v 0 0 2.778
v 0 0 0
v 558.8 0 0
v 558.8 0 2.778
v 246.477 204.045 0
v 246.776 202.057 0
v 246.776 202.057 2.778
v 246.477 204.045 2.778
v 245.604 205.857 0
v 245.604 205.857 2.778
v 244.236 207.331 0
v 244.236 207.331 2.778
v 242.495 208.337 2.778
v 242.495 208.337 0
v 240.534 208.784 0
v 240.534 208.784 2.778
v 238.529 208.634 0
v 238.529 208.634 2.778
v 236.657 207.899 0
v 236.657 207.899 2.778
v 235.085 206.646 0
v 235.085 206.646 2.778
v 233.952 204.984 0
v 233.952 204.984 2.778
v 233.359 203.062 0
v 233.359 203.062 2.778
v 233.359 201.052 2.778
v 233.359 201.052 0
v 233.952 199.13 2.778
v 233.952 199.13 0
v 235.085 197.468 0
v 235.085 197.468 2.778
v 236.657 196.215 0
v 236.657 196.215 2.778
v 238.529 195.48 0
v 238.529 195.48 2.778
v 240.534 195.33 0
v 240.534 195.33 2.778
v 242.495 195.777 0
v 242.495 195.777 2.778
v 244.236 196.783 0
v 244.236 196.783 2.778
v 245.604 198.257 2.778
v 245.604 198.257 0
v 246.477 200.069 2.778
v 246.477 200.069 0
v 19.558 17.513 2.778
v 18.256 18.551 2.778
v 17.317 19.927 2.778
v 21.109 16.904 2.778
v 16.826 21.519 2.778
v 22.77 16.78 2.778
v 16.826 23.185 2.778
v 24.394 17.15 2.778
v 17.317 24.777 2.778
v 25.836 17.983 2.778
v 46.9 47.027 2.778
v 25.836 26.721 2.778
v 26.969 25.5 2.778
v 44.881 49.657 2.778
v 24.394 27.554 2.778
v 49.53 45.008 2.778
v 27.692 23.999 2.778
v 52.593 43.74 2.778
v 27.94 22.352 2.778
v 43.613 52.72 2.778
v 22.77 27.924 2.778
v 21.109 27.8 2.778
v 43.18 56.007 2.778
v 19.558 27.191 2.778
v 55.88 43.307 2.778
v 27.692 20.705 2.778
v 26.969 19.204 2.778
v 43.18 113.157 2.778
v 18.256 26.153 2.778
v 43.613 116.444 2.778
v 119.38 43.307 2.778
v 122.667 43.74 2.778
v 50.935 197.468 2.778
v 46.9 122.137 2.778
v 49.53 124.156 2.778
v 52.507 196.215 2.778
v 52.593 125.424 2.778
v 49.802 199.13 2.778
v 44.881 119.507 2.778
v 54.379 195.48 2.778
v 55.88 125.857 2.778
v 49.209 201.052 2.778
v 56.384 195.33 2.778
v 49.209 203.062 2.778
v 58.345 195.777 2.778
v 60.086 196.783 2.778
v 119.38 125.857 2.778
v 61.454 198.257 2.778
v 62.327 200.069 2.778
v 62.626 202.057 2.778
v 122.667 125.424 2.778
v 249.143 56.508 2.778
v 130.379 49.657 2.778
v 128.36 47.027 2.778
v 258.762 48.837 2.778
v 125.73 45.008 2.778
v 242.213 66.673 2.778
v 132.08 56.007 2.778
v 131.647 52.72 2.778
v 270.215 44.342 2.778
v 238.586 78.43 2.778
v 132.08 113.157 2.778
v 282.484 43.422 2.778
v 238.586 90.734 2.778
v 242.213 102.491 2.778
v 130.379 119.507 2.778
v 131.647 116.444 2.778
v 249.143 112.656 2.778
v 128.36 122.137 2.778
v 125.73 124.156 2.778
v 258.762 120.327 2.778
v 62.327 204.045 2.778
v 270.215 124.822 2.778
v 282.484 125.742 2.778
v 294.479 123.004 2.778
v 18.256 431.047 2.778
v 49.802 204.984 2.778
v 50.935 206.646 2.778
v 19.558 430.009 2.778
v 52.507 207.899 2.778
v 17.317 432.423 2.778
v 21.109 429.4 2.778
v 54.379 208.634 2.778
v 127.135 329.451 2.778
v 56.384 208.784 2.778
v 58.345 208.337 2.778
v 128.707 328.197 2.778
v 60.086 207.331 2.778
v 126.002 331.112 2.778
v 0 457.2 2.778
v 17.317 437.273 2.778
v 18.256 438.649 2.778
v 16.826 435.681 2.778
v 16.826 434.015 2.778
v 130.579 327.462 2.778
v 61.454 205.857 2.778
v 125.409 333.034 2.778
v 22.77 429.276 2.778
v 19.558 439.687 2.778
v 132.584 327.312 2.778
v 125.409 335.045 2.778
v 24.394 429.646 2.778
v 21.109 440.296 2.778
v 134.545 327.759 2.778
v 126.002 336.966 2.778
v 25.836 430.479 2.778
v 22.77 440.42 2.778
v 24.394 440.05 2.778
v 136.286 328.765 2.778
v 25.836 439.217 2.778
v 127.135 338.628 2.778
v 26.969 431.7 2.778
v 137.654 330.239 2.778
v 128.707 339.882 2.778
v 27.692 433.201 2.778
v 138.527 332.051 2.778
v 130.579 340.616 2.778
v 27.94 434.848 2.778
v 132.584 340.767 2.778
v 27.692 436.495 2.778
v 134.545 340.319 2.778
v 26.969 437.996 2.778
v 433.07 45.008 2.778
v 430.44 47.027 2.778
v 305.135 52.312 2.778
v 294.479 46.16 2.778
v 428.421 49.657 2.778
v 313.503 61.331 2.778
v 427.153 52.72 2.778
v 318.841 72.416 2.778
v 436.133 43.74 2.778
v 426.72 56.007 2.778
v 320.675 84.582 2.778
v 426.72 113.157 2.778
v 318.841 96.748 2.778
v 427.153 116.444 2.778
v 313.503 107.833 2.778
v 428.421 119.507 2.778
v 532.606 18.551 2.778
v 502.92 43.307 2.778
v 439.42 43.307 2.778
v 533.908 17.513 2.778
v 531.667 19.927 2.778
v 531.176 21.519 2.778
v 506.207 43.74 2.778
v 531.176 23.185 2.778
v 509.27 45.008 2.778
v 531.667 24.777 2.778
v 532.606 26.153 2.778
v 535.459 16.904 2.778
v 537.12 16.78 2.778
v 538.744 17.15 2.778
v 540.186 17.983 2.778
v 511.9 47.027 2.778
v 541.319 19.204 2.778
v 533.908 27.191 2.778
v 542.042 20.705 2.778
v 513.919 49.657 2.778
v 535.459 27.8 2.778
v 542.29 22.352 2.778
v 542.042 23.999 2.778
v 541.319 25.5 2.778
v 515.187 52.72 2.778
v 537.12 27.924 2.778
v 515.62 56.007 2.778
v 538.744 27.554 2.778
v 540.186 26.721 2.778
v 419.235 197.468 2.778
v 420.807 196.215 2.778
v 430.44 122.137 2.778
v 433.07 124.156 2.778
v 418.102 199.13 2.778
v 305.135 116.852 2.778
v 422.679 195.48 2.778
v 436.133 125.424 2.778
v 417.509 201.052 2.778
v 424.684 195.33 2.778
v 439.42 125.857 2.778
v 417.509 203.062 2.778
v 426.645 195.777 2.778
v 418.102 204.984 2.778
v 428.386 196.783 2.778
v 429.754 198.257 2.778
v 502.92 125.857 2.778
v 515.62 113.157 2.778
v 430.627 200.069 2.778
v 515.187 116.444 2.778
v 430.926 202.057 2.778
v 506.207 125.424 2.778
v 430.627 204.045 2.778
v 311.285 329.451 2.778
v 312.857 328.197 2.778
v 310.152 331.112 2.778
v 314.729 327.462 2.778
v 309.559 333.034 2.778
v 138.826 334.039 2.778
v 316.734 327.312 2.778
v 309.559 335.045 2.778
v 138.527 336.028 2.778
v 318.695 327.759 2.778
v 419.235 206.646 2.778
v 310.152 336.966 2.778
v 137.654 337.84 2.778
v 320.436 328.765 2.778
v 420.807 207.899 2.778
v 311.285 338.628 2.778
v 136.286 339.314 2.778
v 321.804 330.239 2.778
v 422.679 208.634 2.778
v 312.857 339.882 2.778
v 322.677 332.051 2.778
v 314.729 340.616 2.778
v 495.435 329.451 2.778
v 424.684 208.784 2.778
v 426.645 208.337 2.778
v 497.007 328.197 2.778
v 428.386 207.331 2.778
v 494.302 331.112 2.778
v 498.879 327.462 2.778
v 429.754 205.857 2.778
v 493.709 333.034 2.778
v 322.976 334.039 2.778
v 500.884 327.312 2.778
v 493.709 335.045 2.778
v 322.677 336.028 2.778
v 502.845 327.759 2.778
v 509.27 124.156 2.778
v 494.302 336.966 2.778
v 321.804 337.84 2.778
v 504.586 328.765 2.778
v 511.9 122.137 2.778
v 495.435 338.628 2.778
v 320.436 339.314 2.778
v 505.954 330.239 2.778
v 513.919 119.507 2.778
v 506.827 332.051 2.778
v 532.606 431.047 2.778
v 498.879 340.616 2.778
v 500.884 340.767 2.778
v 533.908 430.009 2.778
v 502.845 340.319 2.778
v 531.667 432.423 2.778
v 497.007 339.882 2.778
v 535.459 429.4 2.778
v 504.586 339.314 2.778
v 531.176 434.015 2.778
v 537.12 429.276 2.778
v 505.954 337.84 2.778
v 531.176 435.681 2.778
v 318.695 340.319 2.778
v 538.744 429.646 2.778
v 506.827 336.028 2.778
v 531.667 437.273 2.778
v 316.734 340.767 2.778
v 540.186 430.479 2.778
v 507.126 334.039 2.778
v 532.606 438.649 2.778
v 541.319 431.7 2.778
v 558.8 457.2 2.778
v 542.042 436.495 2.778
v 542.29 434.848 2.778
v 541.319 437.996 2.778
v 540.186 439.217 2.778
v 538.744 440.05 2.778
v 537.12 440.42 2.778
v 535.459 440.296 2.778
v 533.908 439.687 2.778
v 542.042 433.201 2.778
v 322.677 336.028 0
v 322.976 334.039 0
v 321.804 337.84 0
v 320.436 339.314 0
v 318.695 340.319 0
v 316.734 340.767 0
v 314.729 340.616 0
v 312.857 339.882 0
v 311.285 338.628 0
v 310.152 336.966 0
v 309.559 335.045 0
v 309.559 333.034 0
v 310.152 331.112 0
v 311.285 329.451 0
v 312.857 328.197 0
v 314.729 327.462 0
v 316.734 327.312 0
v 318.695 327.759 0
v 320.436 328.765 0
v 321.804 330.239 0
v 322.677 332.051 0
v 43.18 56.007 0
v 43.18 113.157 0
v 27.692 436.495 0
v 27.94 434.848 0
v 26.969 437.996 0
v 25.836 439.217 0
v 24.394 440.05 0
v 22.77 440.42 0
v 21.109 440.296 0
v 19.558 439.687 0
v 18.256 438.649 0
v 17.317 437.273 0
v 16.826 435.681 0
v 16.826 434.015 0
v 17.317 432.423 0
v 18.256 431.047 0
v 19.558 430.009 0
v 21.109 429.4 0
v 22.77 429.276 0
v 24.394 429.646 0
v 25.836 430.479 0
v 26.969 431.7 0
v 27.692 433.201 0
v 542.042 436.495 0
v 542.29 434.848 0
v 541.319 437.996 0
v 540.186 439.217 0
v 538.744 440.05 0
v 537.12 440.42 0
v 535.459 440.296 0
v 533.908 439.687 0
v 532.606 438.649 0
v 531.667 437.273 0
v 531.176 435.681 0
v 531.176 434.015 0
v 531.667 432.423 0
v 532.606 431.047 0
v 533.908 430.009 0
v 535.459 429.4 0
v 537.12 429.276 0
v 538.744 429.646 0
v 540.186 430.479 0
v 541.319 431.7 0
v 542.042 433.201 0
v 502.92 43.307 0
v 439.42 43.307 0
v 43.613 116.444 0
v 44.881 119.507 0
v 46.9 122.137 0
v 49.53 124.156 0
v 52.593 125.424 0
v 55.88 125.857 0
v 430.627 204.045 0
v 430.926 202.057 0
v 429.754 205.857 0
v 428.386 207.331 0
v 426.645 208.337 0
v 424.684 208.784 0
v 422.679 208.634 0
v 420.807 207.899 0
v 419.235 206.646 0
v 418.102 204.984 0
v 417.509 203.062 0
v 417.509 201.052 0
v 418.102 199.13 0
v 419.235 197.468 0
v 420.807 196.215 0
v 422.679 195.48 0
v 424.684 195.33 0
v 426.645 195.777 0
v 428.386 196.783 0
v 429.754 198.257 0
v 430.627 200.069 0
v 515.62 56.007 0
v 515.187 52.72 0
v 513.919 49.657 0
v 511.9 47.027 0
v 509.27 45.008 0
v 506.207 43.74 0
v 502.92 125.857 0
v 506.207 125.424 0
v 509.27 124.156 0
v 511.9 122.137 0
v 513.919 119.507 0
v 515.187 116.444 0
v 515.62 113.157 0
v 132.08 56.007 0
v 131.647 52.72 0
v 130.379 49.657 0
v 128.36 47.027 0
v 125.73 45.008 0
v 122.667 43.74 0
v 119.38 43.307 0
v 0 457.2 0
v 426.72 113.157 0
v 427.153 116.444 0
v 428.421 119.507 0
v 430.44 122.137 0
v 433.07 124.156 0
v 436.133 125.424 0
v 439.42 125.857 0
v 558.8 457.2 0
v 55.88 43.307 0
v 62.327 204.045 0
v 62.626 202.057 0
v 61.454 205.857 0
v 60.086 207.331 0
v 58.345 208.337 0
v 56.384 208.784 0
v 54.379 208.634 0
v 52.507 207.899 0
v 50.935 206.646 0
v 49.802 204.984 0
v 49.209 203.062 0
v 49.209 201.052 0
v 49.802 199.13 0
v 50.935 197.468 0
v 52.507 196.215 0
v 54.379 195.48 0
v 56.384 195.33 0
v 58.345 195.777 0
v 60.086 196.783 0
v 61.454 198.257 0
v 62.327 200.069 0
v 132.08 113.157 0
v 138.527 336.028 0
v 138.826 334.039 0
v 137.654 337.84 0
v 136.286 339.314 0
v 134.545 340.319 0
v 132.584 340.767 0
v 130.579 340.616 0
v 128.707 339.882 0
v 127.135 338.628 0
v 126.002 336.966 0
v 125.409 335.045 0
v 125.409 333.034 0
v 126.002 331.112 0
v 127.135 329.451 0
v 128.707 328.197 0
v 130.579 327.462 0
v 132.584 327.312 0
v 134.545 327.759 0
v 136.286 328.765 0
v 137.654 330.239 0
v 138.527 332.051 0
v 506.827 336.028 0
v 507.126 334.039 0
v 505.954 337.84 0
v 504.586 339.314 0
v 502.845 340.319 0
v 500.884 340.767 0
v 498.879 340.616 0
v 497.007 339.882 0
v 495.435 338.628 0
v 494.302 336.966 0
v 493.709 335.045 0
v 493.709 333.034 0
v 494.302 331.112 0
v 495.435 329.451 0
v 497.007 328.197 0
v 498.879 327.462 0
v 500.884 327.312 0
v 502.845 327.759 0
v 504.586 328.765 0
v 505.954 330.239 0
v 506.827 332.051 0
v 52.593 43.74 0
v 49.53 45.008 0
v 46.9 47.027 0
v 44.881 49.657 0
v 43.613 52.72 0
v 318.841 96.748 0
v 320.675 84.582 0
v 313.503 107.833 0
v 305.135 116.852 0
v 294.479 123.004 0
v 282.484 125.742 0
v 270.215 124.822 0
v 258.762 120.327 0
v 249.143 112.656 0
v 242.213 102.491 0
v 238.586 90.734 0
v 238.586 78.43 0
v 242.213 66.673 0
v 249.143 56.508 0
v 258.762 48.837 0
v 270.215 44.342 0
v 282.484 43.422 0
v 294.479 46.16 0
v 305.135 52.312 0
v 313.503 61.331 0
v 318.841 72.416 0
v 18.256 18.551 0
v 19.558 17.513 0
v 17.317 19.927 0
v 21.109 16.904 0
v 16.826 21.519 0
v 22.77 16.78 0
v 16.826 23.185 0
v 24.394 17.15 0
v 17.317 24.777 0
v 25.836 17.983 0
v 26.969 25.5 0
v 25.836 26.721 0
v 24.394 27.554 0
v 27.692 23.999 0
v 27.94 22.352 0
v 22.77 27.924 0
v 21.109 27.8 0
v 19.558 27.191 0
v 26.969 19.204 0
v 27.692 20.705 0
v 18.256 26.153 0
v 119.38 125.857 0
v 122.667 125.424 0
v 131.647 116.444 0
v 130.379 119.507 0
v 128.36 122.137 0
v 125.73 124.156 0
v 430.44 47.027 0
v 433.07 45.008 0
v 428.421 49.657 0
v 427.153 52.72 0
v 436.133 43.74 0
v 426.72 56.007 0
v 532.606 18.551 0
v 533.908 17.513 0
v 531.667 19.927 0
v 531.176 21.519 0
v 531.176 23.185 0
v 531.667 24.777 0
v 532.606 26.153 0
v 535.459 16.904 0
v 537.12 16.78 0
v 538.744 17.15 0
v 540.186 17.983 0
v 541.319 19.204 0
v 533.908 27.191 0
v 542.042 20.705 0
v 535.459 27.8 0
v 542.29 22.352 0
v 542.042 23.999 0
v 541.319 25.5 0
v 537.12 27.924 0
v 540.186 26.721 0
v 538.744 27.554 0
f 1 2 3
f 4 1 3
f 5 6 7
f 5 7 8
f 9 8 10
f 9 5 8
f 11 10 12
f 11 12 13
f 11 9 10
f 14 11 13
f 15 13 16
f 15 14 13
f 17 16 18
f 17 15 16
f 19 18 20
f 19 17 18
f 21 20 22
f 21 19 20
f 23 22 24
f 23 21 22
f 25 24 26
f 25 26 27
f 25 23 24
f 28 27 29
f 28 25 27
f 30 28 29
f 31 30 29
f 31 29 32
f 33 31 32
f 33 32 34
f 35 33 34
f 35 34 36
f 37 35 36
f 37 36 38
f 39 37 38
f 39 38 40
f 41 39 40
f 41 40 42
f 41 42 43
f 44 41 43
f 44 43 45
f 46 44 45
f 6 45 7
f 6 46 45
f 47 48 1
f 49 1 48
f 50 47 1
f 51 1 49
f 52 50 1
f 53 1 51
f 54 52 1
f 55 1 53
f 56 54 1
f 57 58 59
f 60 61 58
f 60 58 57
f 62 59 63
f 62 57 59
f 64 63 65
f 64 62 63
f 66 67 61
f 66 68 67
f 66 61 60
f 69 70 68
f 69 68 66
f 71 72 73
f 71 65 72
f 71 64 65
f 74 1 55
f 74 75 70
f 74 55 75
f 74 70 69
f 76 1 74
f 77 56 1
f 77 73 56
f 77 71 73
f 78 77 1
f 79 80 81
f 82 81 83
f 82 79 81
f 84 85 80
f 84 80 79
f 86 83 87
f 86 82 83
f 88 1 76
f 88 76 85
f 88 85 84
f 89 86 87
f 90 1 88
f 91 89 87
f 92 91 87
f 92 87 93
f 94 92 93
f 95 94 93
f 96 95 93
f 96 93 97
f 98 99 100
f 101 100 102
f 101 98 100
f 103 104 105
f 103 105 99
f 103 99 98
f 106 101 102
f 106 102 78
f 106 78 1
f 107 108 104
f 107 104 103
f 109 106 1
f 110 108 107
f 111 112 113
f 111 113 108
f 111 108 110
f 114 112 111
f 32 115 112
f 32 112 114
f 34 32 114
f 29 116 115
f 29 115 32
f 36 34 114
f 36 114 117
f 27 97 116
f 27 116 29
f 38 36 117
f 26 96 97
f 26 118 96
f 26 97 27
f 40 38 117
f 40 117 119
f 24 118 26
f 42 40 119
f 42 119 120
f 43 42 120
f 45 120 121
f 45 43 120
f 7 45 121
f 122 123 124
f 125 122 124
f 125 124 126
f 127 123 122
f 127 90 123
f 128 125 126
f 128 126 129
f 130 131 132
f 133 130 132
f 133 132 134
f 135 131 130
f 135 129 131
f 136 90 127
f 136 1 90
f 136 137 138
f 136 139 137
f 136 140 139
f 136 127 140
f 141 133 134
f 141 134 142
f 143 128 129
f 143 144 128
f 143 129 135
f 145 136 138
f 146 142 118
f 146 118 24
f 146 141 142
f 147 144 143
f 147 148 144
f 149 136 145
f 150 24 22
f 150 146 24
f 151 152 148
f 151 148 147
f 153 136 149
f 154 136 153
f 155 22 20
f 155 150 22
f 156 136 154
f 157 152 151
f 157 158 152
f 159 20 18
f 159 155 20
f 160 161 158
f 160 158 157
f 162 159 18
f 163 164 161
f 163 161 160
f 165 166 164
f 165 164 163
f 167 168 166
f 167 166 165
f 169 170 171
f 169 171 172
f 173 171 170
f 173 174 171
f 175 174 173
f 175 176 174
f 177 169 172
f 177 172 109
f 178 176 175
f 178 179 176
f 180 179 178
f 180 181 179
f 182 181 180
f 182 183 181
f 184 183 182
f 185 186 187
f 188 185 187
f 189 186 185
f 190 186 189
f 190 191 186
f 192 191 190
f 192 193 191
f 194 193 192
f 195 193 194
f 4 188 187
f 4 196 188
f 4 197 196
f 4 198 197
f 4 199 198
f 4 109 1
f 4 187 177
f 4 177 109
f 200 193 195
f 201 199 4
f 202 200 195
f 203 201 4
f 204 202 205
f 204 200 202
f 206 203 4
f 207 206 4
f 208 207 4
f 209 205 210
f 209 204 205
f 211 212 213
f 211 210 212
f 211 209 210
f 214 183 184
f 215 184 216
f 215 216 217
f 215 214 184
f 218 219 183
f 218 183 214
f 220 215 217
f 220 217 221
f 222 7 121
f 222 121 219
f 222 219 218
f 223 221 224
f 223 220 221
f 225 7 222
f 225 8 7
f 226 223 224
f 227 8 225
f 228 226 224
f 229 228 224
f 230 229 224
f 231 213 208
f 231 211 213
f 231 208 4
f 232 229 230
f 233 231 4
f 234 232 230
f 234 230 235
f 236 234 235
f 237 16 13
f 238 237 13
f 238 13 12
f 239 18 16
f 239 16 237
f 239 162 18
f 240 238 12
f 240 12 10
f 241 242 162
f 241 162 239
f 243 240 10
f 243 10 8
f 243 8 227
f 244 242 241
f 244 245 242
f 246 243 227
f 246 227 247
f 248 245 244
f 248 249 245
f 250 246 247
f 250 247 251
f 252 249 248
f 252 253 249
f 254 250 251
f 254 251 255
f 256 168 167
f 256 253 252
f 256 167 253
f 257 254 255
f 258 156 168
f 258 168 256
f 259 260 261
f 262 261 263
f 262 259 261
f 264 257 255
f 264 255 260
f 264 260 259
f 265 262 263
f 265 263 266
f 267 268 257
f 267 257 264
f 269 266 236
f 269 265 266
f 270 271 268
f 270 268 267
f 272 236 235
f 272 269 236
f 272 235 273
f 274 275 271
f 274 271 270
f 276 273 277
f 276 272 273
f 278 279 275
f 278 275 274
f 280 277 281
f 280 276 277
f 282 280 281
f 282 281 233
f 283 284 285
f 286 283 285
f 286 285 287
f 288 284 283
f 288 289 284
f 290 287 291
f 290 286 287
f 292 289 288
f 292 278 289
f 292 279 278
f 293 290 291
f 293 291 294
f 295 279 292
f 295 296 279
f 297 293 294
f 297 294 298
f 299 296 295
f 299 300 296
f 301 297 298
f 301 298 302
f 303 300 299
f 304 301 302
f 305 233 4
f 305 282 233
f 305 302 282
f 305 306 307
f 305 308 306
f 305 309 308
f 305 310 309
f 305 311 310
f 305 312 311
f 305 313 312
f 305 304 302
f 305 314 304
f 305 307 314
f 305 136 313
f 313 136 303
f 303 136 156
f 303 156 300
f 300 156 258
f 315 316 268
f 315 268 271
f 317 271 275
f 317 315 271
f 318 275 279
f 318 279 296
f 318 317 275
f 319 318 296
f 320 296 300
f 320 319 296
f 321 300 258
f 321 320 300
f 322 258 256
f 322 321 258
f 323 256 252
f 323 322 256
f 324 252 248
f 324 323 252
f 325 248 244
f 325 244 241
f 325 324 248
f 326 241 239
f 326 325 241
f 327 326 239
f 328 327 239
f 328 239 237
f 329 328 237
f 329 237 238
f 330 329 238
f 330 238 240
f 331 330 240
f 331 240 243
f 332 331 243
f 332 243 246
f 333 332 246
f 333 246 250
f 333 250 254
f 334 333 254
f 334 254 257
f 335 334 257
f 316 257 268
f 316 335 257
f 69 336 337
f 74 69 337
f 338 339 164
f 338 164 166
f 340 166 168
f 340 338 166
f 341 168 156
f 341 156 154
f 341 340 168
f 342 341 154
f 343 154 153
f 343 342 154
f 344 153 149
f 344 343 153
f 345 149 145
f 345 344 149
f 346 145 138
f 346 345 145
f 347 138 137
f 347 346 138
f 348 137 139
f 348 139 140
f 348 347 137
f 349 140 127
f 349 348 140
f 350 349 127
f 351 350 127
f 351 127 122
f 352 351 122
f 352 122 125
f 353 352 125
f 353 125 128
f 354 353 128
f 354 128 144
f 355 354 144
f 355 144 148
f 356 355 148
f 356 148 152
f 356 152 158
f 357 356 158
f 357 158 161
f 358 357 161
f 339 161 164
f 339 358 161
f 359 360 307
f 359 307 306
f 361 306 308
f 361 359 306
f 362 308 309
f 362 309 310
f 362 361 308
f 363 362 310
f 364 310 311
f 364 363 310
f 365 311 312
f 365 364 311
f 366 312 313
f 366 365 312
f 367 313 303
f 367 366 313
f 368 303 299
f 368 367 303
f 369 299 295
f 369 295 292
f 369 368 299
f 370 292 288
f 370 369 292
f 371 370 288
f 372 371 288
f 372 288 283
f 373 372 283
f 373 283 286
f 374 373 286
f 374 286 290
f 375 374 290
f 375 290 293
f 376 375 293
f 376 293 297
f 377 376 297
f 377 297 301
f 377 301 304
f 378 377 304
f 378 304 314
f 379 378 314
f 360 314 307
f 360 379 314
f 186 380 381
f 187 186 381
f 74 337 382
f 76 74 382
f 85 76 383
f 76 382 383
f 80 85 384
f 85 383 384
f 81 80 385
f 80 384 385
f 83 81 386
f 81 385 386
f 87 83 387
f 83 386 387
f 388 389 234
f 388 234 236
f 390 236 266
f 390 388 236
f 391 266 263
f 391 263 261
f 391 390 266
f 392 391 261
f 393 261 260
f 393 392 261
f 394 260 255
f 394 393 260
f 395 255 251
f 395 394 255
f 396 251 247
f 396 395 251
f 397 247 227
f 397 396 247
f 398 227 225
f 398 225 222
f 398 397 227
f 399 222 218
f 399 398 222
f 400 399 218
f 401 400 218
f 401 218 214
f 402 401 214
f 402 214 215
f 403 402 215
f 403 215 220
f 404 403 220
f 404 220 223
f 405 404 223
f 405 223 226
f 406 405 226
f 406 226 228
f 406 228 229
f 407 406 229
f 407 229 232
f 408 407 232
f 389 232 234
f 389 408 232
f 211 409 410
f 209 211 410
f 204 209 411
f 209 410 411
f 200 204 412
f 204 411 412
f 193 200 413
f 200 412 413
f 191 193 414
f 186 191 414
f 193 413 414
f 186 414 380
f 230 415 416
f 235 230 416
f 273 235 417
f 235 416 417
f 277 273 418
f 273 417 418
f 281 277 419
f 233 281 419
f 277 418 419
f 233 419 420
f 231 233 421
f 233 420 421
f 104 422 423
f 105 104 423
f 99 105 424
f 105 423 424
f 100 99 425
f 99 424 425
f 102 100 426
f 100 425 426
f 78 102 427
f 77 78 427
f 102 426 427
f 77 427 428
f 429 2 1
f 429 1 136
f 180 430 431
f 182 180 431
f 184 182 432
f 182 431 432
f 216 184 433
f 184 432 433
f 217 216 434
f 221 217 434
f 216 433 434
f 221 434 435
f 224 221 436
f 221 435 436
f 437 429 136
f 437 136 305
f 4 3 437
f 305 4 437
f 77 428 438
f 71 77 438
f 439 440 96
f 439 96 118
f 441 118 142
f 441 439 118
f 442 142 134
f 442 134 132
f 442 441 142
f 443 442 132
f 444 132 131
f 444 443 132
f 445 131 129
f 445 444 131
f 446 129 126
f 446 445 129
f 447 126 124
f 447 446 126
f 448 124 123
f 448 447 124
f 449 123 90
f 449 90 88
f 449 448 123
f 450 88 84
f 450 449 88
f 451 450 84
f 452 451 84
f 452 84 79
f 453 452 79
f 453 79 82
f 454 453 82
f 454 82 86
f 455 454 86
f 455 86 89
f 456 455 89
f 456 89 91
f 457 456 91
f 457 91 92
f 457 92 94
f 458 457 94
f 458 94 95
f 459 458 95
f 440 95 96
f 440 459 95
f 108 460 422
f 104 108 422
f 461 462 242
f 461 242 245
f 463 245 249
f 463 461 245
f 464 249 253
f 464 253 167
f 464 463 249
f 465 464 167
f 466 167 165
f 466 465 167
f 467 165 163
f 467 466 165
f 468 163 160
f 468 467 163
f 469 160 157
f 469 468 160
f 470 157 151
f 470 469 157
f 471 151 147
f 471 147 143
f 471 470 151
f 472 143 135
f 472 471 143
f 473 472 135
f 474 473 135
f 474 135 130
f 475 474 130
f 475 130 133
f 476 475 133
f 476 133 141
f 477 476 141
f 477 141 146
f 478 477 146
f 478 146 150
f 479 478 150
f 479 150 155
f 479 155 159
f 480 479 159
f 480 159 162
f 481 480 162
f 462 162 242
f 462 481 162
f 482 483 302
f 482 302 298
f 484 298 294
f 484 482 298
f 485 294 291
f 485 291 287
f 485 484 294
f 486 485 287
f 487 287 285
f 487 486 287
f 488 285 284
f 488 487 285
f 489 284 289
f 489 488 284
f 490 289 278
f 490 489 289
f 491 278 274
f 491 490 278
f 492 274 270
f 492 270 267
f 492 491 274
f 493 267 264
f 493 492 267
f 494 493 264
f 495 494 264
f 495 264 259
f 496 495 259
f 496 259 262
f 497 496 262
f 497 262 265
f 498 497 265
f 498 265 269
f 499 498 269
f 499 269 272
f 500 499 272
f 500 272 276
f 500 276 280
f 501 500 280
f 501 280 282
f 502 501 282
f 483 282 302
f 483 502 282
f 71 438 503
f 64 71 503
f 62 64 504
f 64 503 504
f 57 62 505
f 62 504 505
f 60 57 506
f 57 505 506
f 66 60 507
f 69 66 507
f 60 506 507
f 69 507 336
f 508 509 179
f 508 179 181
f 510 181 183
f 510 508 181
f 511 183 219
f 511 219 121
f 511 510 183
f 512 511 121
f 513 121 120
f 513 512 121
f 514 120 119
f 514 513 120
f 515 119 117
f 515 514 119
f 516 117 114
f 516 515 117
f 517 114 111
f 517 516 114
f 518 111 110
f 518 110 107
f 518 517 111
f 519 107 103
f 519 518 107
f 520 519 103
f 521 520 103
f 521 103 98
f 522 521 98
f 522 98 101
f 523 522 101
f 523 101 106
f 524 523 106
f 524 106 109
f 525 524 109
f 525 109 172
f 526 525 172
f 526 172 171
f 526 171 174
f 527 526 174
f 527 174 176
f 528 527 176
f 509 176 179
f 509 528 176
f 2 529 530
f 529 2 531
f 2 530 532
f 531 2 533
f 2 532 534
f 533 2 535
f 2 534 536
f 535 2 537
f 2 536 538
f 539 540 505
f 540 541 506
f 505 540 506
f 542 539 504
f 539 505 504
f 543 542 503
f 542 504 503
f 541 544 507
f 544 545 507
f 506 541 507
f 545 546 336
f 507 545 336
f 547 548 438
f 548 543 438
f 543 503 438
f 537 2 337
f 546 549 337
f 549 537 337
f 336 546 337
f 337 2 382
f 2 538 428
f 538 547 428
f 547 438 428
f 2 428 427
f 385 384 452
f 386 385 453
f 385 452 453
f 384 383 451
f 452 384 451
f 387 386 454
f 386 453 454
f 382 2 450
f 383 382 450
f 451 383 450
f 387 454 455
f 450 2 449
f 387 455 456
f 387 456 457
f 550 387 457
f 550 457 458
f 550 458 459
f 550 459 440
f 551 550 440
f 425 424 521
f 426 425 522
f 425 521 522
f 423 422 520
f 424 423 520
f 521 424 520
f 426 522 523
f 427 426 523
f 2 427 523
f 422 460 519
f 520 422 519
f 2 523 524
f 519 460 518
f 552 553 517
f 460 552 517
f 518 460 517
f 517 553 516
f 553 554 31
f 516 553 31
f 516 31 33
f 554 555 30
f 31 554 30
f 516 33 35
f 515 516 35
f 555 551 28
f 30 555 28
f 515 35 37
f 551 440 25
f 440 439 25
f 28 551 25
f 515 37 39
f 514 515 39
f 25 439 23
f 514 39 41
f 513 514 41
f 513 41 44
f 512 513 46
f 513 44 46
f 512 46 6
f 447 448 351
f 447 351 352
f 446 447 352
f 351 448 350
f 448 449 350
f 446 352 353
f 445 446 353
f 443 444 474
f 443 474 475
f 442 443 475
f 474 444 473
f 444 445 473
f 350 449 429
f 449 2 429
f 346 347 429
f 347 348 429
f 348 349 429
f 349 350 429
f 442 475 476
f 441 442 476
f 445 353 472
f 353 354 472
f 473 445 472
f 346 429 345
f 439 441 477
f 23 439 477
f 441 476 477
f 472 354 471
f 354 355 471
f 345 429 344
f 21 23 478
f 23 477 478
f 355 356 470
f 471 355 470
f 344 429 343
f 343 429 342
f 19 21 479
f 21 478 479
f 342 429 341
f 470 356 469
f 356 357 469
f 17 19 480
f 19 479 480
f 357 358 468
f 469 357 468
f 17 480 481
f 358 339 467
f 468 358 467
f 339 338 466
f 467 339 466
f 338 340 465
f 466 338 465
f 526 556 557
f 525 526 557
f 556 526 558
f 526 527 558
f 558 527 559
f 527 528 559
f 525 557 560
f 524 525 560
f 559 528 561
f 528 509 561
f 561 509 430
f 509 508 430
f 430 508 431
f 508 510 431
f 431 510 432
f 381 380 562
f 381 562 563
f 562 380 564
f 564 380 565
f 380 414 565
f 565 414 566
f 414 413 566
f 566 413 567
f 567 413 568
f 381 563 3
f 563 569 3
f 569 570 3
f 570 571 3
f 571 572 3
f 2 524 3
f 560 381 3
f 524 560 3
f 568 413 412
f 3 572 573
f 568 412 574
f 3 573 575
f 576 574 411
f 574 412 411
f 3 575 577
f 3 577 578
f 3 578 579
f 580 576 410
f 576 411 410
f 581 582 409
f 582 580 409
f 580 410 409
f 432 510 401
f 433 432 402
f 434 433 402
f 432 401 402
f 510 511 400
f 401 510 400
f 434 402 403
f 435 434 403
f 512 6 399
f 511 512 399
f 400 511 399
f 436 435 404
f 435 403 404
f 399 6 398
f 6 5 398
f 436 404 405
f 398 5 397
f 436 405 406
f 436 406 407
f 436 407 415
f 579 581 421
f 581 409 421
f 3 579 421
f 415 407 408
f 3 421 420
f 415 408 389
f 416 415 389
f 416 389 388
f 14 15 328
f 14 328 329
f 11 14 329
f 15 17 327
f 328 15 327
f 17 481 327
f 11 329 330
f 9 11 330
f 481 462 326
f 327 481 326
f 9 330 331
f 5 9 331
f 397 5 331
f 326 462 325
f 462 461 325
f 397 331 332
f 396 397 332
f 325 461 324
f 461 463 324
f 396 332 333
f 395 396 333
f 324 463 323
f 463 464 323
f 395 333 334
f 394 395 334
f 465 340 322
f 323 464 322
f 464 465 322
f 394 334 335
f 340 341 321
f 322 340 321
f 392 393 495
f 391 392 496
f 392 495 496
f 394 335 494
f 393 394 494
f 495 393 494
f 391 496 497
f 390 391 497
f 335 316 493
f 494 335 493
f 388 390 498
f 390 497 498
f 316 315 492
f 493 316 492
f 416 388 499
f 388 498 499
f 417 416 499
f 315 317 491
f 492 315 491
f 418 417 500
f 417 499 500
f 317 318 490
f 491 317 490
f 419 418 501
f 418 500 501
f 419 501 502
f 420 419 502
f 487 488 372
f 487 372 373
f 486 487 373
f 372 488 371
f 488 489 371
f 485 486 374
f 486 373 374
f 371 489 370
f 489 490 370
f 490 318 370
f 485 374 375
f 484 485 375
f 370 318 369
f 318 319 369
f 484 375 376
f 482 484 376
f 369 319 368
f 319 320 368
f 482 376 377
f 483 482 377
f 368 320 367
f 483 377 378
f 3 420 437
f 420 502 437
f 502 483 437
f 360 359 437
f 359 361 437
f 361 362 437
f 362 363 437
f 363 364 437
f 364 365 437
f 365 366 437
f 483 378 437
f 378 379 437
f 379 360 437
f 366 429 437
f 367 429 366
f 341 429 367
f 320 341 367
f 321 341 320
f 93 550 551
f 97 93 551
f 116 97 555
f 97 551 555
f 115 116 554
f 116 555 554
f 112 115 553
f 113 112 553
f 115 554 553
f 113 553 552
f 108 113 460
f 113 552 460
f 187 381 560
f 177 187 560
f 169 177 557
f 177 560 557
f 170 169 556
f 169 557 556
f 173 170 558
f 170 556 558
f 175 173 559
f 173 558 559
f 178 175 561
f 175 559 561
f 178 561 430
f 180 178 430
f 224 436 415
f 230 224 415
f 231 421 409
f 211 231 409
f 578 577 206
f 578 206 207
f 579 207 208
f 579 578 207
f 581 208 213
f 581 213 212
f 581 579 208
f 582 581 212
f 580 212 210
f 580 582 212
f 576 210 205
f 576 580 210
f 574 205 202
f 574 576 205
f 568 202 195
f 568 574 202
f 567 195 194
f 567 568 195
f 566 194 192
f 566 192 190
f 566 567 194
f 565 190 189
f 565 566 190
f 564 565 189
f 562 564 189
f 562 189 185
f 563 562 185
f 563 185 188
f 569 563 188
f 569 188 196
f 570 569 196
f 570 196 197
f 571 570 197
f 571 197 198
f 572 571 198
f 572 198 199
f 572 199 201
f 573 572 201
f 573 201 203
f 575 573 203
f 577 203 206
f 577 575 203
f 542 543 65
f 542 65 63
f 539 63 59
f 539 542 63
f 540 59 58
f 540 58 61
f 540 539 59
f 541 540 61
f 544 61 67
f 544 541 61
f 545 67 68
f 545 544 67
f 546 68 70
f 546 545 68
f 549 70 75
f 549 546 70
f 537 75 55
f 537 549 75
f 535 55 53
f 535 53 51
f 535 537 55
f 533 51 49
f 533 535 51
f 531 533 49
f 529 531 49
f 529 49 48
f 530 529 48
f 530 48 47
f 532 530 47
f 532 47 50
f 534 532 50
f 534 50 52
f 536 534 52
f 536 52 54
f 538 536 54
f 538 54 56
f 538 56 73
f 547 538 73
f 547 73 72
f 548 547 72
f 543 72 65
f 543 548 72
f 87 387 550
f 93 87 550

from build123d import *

# Parameters (mm, degrees)
F0_W     = 558.8
F0_H     = 457.2
F0_R     = 5.588
F0_R_2   = 6.74624
F0_R_3   = 41.275
F1_DEPTH = 2.778125


with BuildPart() as f1:
    # F0 (on Top) → F1 (new body)
    with BuildSketch(Plane.XY):
        with Locations((279.4, 228.6)):
            Rectangle(F0_W, F0_H)
        with Locations((22.352, 22.352)):
            Circle(F0_R, mode=Mode.SUBTRACT)
        with BuildLine():
            ThreePointArc((43.18, 113.157), (46.899744, 122.137256), (55.88, 125.857))
            Line((55.88, 125.857), (119.38, 125.857))
            ThreePointArc((119.38, 125.857), (128.360256, 122.137256), (132.08, 113.157))
            Line((132.08, 113.157), (132.08, 56.007))
            ThreePointArc((132.08, 56.007), (128.360256, 47.026744), (119.38, 43.307))
            Line((119.38, 43.307), (55.88, 43.307))
            ThreePointArc((55.88, 43.307), (46.899744, 47.026744), (43.18, 56.007))
            Line((43.18, 56.007), (43.18, 113.157))
        make_face(mode=Mode.SUBTRACT)
        with Locations((55.88, 202.057)):
            Circle(F0_R_2, mode=Mode.SUBTRACT)
        with Locations((240.03, 202.057)):
            Circle(F0_R_2, mode=Mode.SUBTRACT)
        with Locations((279.4, 84.582)):
            Circle(F0_R_3, mode=Mode.SUBTRACT)
        with Locations((536.702, 22.352)):
            Circle(F0_R, mode=Mode.SUBTRACT)
        with BuildLine():
            Line((439.42, 125.857), (502.92, 125.857))
            ThreePointArc((502.92, 125.857), (511.900256, 122.137256), (515.62, 113.157))
            Line((515.62, 113.157), (515.62, 56.007))
            ThreePointArc((515.62, 56.007), (511.900256, 47.026744), (502.92, 43.307))
            Line((502.92, 43.307), (439.42, 43.307))
            ThreePointArc((439.42, 43.307), (430.439744, 47.026744), (426.72, 56.007))
            Line((426.72, 56.007), (426.72, 113.157))
            ThreePointArc((426.72, 113.157), (430.439744, 122.137256), (439.42, 125.857))
        make_face(mode=Mode.SUBTRACT)
        with Locations((424.18, 202.057)):
            Circle(F0_R_2, mode=Mode.SUBTRACT)
        with Locations((132.08, 334.039272)):
            Circle(F0_R_2, mode=Mode.SUBTRACT)
        with Locations((22.352, 434.848)):
            Circle(F0_R, mode=Mode.SUBTRACT)
        with Locations((316.23, 334.039272)):
            Circle(F0_R_2, mode=Mode.SUBTRACT)
        with Locations((500.38, 334.039272)):
            Circle(F0_R_2, mode=Mode.SUBTRACT)
        with Locations((536.702, 434.848)):
            Circle(F0_R, mode=Mode.SUBTRACT)
    extrude(amount=F1_DEPTH)


solid = f1.part
